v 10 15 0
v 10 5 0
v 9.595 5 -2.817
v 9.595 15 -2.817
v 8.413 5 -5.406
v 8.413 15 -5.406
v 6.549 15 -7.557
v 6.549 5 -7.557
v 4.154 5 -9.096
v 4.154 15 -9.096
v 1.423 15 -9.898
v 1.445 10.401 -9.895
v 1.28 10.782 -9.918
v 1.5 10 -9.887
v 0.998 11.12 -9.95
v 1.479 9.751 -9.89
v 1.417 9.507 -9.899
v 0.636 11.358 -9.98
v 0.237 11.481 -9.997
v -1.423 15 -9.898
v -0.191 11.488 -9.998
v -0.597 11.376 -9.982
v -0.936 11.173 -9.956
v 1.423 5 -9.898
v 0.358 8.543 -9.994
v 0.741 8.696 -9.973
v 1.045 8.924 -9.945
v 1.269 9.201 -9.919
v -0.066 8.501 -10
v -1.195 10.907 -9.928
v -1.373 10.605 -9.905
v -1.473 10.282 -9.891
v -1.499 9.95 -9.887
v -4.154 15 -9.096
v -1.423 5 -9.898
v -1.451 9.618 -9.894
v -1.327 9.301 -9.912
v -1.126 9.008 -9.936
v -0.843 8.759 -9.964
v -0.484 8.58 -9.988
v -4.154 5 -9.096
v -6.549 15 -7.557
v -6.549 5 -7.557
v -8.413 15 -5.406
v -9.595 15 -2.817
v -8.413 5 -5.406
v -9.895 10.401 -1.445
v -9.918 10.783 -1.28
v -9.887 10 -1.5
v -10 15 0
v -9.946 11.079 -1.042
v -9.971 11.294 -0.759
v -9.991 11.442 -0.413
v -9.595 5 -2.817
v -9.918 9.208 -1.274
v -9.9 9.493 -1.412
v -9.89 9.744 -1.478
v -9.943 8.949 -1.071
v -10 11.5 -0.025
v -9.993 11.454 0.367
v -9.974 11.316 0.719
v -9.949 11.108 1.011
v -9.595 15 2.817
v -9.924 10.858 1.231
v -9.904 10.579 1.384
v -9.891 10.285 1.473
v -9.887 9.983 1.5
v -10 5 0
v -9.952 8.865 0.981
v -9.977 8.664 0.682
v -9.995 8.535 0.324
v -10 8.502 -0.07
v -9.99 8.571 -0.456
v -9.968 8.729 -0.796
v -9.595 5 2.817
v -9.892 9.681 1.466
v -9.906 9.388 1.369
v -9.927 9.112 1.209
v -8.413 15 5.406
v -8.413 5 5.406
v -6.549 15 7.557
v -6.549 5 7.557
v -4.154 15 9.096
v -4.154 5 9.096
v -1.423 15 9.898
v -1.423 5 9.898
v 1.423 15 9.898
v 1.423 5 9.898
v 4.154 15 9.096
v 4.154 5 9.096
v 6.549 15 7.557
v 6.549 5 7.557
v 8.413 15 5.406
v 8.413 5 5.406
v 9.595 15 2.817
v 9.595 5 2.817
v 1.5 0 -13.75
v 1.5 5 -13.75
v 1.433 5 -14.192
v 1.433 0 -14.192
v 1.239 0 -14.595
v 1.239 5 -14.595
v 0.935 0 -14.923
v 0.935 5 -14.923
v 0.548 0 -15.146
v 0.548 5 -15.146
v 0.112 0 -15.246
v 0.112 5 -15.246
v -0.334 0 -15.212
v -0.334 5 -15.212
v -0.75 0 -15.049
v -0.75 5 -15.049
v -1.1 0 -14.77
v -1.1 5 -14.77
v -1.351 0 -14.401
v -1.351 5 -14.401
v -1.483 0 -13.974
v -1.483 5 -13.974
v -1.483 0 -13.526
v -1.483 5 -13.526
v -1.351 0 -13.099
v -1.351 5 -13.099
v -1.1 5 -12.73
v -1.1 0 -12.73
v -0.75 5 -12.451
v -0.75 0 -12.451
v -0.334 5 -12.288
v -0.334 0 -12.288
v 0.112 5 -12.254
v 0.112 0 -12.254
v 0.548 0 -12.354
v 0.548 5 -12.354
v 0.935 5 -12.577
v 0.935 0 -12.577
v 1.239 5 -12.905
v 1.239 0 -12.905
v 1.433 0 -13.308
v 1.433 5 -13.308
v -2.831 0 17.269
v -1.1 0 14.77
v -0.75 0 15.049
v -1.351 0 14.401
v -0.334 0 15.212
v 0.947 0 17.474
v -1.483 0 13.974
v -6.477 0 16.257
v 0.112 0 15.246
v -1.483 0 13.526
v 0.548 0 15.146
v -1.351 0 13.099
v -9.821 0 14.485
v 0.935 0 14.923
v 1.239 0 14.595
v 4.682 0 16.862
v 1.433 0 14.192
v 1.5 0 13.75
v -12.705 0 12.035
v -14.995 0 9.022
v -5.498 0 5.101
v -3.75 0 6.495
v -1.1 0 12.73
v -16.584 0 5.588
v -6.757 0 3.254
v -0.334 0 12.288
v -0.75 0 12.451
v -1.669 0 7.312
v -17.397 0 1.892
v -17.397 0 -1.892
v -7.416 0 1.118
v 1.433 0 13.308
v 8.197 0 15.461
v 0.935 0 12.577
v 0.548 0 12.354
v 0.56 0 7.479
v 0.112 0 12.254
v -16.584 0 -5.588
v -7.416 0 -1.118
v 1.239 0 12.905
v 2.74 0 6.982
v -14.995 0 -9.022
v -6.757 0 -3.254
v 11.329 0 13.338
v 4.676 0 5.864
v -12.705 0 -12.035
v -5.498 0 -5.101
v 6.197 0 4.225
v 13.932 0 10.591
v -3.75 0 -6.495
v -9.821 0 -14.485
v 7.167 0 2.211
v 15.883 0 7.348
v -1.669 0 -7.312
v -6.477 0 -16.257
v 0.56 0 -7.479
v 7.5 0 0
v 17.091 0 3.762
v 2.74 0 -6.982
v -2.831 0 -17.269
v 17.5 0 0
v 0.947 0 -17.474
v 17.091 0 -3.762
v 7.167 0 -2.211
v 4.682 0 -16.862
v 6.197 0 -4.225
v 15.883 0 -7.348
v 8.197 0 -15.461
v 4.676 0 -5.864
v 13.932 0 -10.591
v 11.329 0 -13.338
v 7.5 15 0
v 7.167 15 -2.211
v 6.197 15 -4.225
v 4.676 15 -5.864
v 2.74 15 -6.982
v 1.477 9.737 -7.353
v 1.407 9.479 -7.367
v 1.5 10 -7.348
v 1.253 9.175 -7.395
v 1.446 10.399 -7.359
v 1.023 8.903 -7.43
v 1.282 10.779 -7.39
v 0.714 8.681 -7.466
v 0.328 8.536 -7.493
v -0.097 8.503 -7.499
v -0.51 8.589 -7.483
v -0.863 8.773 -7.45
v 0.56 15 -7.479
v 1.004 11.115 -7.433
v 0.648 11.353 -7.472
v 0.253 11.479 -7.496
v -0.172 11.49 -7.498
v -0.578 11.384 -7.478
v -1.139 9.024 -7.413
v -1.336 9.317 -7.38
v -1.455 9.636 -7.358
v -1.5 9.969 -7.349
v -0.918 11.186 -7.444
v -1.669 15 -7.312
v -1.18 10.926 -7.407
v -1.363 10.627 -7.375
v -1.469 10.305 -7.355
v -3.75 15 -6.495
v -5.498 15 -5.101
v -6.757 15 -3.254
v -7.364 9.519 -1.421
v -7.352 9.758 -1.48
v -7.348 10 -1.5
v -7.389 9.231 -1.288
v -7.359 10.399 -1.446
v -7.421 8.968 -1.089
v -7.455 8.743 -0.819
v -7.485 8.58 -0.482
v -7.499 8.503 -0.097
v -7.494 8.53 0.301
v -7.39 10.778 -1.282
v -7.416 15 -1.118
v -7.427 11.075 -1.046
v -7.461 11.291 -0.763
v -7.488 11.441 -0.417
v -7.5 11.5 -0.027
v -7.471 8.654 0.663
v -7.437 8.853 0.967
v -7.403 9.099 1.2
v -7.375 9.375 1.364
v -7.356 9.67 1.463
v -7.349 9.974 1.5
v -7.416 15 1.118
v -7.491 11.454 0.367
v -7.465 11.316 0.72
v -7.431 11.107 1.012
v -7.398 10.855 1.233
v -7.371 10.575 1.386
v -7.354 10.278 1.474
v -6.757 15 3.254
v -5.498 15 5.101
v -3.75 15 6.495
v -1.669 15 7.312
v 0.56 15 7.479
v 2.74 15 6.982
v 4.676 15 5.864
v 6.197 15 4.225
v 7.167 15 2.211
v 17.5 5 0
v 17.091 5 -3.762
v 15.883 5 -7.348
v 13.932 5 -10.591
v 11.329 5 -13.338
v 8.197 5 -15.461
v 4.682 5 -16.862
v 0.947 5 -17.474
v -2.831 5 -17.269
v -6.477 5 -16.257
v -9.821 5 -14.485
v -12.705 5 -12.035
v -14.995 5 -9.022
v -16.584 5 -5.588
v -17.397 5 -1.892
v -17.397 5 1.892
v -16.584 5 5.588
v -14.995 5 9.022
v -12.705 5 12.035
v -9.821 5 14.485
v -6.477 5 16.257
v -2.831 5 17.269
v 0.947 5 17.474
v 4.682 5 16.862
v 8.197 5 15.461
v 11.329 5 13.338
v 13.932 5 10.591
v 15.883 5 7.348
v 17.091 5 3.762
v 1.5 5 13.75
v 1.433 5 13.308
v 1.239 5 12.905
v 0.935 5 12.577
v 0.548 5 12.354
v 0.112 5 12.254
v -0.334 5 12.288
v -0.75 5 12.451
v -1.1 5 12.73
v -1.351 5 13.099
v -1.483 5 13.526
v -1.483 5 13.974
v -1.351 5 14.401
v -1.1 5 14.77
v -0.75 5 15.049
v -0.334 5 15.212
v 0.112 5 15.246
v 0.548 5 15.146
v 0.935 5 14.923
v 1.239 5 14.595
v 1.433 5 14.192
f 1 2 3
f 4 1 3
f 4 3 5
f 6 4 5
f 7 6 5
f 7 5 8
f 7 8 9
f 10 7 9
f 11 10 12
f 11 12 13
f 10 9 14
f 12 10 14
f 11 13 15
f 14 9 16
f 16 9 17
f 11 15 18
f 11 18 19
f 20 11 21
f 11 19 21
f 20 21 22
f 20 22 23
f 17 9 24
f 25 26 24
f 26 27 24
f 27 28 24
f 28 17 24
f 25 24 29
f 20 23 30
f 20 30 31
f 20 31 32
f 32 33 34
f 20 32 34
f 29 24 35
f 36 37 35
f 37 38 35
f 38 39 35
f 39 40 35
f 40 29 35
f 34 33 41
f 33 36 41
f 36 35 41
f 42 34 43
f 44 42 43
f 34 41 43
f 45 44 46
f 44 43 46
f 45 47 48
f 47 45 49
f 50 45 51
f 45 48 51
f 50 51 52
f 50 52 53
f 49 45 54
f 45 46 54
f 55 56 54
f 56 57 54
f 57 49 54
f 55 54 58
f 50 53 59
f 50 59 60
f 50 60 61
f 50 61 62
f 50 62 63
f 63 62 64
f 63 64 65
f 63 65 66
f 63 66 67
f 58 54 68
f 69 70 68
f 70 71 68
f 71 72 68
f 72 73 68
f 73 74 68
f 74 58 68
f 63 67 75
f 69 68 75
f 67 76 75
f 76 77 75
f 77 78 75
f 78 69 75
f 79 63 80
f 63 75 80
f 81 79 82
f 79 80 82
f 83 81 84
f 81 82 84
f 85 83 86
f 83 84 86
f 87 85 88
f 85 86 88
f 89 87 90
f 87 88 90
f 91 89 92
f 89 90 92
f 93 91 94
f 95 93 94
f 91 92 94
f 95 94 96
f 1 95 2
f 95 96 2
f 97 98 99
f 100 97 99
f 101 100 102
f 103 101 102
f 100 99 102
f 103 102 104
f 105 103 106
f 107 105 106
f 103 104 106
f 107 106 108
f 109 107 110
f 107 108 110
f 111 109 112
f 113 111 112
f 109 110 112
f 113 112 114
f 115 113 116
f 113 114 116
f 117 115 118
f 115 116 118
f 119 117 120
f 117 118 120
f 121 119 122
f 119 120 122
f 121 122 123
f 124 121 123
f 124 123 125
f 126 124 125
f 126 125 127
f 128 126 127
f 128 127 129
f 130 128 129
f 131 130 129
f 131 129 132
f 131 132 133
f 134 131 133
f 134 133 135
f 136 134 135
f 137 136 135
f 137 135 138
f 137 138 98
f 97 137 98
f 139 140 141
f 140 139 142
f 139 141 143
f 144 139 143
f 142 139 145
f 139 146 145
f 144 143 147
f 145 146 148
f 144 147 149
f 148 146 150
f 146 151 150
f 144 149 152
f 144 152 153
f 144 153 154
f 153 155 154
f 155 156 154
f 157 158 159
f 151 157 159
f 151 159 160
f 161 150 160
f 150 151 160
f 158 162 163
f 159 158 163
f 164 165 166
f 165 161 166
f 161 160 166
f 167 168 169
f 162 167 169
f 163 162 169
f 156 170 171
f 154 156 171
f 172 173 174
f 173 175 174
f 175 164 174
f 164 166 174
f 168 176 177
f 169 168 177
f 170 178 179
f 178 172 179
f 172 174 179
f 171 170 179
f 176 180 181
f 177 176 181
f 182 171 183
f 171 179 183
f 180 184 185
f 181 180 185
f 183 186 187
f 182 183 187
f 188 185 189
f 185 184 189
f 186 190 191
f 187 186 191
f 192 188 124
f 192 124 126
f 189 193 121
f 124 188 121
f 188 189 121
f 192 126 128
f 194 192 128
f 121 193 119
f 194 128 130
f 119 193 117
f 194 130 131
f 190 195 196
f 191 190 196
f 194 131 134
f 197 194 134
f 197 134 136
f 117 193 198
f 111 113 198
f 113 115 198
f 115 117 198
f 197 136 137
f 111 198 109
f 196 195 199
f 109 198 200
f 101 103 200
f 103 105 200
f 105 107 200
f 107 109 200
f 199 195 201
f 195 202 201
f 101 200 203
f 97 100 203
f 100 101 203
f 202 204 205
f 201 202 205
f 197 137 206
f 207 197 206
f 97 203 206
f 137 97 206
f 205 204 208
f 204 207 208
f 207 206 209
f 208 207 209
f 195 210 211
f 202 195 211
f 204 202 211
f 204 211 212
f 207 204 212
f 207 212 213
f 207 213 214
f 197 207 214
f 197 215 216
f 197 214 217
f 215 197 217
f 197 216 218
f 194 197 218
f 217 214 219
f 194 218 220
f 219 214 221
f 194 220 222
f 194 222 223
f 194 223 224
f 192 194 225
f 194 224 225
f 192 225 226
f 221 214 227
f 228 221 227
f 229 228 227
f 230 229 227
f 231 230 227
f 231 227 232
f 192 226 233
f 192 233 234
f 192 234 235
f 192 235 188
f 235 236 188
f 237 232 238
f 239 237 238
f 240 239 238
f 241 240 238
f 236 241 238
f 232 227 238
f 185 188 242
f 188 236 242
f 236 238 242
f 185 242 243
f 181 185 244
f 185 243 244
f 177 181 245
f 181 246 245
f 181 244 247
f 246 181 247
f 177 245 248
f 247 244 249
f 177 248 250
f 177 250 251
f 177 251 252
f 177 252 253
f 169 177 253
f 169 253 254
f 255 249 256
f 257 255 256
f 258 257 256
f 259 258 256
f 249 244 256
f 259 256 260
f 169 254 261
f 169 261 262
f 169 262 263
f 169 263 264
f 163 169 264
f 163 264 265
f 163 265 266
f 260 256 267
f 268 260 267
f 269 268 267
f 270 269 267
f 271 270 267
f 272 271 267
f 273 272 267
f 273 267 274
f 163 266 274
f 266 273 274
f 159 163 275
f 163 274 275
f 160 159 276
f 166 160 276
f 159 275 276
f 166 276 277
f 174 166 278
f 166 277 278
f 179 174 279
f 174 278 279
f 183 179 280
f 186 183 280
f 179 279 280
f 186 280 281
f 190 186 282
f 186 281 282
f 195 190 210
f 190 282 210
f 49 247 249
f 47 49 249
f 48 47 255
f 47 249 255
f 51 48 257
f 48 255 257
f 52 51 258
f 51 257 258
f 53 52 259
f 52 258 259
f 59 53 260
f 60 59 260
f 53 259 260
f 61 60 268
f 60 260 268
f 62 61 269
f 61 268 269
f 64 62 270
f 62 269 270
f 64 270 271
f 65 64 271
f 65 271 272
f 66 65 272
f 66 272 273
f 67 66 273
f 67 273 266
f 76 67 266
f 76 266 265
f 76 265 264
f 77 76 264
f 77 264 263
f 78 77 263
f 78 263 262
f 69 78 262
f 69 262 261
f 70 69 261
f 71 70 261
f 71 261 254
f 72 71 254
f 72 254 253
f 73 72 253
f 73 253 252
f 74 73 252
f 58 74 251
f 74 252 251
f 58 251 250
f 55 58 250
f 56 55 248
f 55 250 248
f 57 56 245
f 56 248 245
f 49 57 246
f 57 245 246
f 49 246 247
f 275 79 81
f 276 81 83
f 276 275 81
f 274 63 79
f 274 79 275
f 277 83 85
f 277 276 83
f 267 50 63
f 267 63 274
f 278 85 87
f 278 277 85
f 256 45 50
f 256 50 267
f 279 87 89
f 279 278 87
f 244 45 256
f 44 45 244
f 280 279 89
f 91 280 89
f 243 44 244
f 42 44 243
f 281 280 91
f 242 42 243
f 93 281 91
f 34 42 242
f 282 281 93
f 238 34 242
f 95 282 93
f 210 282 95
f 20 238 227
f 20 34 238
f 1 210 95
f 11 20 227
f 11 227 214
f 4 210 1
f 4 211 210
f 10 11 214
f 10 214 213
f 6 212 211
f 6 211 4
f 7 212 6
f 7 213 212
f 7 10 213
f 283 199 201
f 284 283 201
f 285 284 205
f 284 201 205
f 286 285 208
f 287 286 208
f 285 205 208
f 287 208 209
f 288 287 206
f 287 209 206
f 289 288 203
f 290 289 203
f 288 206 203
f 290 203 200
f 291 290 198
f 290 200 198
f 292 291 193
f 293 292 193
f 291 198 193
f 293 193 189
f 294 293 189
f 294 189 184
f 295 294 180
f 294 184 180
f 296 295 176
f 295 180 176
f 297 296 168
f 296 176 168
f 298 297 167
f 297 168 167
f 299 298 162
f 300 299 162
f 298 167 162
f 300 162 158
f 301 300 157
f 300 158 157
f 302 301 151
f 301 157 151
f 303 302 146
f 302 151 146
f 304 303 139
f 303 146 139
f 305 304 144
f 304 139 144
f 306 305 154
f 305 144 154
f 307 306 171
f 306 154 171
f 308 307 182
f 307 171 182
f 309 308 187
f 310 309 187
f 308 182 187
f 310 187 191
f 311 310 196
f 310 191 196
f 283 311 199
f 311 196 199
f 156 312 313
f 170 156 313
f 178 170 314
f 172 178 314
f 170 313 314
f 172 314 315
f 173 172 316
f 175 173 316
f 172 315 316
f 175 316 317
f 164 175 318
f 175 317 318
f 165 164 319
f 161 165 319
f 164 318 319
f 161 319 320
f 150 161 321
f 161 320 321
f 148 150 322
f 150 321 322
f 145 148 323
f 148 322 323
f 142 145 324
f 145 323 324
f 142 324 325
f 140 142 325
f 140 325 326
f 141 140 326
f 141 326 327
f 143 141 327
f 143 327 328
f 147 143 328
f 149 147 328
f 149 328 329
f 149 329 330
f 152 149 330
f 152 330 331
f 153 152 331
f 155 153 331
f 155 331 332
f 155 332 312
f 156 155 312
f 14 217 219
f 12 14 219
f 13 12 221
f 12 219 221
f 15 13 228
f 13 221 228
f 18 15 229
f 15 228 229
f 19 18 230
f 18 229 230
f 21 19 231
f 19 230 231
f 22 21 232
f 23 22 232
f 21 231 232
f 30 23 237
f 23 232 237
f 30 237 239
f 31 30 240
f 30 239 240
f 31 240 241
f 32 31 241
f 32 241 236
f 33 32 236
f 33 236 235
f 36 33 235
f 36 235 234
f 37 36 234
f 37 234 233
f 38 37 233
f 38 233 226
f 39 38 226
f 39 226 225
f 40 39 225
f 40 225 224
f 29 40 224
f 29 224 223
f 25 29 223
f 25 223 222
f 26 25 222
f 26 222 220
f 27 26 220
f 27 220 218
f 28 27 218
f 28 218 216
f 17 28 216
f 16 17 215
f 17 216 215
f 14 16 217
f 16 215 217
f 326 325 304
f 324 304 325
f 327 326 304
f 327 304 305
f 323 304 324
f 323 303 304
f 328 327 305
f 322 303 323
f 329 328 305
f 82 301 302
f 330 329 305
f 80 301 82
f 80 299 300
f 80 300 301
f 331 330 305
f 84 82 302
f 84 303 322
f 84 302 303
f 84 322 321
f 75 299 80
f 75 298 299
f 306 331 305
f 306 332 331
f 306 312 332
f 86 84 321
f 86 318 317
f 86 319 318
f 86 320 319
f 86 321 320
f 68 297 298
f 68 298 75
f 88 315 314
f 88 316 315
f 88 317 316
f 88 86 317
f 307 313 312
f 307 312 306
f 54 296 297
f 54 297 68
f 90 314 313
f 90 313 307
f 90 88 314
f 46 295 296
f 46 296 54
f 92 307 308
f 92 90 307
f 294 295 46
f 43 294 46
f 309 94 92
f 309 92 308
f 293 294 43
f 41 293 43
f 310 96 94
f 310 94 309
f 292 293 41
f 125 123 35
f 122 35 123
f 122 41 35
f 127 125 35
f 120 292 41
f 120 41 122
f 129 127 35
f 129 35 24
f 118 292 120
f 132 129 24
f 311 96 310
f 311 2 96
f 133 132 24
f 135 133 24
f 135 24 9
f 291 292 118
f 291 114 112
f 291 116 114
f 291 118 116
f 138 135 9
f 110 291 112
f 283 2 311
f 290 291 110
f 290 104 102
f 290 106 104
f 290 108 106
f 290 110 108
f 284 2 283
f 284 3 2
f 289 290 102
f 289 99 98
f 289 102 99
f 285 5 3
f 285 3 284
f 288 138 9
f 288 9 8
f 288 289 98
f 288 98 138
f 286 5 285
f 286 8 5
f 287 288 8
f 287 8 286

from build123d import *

# Parameters (mm, degrees)
ESBO_O1_R                = 17.5
RESSALTO_EXTRUS_O1_DEPTH = 5
ESBO_O2_R                = 10
RESSALTO_EXTRUS_O2_DEPTH = 10
ESBO_O3_R                = 7.5
CORTE_EXTRUS_O1_DEPTH    = 16
ESBO_O4_R                = 1.5
CORTE_EXTRUS_O2_DEPTH    = 10
ESBO_O5_R                = 1.5
CORTE_EXTRUS_O3_DEPTH    = 10
ESBO_O6_R                = 1.5
CORTE_EXTRUS_O4_DEPTH    = 10


with BuildPart() as part:
    # Esboço1 → Ressalto-extrusão1 (new body)
    with BuildSketch(Plane(origin=(0, 0, 0), x_dir=(1, 0, 0), z_dir=(0, 1, 0))):
        Circle(ESBO_O1_R)
    extrude(amount=RESSALTO_EXTRUS_O1_DEPTH)

    # Esboço2 → Ressalto-extrusão2 (add)
    with BuildSketch(Plane(origin=(0, 5, 0), x_dir=(1, 0, 0), z_dir=(0, 1, 0))):
        Circle(ESBO_O2_R)
    extrude(amount=RESSALTO_EXTRUS_O2_DEPTH)

    # Esboço3 → Corte-extrusão1 (cut, through all)
    with BuildSketch(Plane(origin=(0, 15, 0), x_dir=(1, 0, 0), z_dir=(0, 1, 0))):
        Circle(ESBO_O3_R)
    extrude(amount=-CORTE_EXTRUS_O1_DEPTH, mode=Mode.SUBTRACT)

    # Esboço4 → Corte-extrusão2 (cut)
    with BuildSketch(Plane(origin=(0, 5, 0), x_dir=(1, 0, 0), z_dir=(0, 1, 0))):
        with Locations((0, 13.75)):
            Circle(ESBO_O4_R)
        with Locations((0, -13.75)):
            Circle(ESBO_O4_R)
    extrude(amount=-CORTE_EXTRUS_O2_DEPTH, mode=Mode.SUBTRACT)

    # Esboço5 → Corte-extrusão3 (cut)
    with BuildSketch(Plane.XY):
        with Locations((0, 10)):
            Circle(ESBO_O5_R)
    extrude(amount=-CORTE_EXTRUS_O3_DEPTH, mode=Mode.SUBTRACT)

    # Esboço6 → Corte-extrusão4 (cut)
    with BuildSketch(Plane(origin=(0, 0, 0), x_dir=(0, 0, -1), z_dir=(1, 0, 0))):
        with Locations((0, 10)):
            Circle(ESBO_O6_R)
    extrude(amount=-CORTE_EXTRUS_O4_DEPTH, mode=Mode.SUBTRACT)


solid = part.part
